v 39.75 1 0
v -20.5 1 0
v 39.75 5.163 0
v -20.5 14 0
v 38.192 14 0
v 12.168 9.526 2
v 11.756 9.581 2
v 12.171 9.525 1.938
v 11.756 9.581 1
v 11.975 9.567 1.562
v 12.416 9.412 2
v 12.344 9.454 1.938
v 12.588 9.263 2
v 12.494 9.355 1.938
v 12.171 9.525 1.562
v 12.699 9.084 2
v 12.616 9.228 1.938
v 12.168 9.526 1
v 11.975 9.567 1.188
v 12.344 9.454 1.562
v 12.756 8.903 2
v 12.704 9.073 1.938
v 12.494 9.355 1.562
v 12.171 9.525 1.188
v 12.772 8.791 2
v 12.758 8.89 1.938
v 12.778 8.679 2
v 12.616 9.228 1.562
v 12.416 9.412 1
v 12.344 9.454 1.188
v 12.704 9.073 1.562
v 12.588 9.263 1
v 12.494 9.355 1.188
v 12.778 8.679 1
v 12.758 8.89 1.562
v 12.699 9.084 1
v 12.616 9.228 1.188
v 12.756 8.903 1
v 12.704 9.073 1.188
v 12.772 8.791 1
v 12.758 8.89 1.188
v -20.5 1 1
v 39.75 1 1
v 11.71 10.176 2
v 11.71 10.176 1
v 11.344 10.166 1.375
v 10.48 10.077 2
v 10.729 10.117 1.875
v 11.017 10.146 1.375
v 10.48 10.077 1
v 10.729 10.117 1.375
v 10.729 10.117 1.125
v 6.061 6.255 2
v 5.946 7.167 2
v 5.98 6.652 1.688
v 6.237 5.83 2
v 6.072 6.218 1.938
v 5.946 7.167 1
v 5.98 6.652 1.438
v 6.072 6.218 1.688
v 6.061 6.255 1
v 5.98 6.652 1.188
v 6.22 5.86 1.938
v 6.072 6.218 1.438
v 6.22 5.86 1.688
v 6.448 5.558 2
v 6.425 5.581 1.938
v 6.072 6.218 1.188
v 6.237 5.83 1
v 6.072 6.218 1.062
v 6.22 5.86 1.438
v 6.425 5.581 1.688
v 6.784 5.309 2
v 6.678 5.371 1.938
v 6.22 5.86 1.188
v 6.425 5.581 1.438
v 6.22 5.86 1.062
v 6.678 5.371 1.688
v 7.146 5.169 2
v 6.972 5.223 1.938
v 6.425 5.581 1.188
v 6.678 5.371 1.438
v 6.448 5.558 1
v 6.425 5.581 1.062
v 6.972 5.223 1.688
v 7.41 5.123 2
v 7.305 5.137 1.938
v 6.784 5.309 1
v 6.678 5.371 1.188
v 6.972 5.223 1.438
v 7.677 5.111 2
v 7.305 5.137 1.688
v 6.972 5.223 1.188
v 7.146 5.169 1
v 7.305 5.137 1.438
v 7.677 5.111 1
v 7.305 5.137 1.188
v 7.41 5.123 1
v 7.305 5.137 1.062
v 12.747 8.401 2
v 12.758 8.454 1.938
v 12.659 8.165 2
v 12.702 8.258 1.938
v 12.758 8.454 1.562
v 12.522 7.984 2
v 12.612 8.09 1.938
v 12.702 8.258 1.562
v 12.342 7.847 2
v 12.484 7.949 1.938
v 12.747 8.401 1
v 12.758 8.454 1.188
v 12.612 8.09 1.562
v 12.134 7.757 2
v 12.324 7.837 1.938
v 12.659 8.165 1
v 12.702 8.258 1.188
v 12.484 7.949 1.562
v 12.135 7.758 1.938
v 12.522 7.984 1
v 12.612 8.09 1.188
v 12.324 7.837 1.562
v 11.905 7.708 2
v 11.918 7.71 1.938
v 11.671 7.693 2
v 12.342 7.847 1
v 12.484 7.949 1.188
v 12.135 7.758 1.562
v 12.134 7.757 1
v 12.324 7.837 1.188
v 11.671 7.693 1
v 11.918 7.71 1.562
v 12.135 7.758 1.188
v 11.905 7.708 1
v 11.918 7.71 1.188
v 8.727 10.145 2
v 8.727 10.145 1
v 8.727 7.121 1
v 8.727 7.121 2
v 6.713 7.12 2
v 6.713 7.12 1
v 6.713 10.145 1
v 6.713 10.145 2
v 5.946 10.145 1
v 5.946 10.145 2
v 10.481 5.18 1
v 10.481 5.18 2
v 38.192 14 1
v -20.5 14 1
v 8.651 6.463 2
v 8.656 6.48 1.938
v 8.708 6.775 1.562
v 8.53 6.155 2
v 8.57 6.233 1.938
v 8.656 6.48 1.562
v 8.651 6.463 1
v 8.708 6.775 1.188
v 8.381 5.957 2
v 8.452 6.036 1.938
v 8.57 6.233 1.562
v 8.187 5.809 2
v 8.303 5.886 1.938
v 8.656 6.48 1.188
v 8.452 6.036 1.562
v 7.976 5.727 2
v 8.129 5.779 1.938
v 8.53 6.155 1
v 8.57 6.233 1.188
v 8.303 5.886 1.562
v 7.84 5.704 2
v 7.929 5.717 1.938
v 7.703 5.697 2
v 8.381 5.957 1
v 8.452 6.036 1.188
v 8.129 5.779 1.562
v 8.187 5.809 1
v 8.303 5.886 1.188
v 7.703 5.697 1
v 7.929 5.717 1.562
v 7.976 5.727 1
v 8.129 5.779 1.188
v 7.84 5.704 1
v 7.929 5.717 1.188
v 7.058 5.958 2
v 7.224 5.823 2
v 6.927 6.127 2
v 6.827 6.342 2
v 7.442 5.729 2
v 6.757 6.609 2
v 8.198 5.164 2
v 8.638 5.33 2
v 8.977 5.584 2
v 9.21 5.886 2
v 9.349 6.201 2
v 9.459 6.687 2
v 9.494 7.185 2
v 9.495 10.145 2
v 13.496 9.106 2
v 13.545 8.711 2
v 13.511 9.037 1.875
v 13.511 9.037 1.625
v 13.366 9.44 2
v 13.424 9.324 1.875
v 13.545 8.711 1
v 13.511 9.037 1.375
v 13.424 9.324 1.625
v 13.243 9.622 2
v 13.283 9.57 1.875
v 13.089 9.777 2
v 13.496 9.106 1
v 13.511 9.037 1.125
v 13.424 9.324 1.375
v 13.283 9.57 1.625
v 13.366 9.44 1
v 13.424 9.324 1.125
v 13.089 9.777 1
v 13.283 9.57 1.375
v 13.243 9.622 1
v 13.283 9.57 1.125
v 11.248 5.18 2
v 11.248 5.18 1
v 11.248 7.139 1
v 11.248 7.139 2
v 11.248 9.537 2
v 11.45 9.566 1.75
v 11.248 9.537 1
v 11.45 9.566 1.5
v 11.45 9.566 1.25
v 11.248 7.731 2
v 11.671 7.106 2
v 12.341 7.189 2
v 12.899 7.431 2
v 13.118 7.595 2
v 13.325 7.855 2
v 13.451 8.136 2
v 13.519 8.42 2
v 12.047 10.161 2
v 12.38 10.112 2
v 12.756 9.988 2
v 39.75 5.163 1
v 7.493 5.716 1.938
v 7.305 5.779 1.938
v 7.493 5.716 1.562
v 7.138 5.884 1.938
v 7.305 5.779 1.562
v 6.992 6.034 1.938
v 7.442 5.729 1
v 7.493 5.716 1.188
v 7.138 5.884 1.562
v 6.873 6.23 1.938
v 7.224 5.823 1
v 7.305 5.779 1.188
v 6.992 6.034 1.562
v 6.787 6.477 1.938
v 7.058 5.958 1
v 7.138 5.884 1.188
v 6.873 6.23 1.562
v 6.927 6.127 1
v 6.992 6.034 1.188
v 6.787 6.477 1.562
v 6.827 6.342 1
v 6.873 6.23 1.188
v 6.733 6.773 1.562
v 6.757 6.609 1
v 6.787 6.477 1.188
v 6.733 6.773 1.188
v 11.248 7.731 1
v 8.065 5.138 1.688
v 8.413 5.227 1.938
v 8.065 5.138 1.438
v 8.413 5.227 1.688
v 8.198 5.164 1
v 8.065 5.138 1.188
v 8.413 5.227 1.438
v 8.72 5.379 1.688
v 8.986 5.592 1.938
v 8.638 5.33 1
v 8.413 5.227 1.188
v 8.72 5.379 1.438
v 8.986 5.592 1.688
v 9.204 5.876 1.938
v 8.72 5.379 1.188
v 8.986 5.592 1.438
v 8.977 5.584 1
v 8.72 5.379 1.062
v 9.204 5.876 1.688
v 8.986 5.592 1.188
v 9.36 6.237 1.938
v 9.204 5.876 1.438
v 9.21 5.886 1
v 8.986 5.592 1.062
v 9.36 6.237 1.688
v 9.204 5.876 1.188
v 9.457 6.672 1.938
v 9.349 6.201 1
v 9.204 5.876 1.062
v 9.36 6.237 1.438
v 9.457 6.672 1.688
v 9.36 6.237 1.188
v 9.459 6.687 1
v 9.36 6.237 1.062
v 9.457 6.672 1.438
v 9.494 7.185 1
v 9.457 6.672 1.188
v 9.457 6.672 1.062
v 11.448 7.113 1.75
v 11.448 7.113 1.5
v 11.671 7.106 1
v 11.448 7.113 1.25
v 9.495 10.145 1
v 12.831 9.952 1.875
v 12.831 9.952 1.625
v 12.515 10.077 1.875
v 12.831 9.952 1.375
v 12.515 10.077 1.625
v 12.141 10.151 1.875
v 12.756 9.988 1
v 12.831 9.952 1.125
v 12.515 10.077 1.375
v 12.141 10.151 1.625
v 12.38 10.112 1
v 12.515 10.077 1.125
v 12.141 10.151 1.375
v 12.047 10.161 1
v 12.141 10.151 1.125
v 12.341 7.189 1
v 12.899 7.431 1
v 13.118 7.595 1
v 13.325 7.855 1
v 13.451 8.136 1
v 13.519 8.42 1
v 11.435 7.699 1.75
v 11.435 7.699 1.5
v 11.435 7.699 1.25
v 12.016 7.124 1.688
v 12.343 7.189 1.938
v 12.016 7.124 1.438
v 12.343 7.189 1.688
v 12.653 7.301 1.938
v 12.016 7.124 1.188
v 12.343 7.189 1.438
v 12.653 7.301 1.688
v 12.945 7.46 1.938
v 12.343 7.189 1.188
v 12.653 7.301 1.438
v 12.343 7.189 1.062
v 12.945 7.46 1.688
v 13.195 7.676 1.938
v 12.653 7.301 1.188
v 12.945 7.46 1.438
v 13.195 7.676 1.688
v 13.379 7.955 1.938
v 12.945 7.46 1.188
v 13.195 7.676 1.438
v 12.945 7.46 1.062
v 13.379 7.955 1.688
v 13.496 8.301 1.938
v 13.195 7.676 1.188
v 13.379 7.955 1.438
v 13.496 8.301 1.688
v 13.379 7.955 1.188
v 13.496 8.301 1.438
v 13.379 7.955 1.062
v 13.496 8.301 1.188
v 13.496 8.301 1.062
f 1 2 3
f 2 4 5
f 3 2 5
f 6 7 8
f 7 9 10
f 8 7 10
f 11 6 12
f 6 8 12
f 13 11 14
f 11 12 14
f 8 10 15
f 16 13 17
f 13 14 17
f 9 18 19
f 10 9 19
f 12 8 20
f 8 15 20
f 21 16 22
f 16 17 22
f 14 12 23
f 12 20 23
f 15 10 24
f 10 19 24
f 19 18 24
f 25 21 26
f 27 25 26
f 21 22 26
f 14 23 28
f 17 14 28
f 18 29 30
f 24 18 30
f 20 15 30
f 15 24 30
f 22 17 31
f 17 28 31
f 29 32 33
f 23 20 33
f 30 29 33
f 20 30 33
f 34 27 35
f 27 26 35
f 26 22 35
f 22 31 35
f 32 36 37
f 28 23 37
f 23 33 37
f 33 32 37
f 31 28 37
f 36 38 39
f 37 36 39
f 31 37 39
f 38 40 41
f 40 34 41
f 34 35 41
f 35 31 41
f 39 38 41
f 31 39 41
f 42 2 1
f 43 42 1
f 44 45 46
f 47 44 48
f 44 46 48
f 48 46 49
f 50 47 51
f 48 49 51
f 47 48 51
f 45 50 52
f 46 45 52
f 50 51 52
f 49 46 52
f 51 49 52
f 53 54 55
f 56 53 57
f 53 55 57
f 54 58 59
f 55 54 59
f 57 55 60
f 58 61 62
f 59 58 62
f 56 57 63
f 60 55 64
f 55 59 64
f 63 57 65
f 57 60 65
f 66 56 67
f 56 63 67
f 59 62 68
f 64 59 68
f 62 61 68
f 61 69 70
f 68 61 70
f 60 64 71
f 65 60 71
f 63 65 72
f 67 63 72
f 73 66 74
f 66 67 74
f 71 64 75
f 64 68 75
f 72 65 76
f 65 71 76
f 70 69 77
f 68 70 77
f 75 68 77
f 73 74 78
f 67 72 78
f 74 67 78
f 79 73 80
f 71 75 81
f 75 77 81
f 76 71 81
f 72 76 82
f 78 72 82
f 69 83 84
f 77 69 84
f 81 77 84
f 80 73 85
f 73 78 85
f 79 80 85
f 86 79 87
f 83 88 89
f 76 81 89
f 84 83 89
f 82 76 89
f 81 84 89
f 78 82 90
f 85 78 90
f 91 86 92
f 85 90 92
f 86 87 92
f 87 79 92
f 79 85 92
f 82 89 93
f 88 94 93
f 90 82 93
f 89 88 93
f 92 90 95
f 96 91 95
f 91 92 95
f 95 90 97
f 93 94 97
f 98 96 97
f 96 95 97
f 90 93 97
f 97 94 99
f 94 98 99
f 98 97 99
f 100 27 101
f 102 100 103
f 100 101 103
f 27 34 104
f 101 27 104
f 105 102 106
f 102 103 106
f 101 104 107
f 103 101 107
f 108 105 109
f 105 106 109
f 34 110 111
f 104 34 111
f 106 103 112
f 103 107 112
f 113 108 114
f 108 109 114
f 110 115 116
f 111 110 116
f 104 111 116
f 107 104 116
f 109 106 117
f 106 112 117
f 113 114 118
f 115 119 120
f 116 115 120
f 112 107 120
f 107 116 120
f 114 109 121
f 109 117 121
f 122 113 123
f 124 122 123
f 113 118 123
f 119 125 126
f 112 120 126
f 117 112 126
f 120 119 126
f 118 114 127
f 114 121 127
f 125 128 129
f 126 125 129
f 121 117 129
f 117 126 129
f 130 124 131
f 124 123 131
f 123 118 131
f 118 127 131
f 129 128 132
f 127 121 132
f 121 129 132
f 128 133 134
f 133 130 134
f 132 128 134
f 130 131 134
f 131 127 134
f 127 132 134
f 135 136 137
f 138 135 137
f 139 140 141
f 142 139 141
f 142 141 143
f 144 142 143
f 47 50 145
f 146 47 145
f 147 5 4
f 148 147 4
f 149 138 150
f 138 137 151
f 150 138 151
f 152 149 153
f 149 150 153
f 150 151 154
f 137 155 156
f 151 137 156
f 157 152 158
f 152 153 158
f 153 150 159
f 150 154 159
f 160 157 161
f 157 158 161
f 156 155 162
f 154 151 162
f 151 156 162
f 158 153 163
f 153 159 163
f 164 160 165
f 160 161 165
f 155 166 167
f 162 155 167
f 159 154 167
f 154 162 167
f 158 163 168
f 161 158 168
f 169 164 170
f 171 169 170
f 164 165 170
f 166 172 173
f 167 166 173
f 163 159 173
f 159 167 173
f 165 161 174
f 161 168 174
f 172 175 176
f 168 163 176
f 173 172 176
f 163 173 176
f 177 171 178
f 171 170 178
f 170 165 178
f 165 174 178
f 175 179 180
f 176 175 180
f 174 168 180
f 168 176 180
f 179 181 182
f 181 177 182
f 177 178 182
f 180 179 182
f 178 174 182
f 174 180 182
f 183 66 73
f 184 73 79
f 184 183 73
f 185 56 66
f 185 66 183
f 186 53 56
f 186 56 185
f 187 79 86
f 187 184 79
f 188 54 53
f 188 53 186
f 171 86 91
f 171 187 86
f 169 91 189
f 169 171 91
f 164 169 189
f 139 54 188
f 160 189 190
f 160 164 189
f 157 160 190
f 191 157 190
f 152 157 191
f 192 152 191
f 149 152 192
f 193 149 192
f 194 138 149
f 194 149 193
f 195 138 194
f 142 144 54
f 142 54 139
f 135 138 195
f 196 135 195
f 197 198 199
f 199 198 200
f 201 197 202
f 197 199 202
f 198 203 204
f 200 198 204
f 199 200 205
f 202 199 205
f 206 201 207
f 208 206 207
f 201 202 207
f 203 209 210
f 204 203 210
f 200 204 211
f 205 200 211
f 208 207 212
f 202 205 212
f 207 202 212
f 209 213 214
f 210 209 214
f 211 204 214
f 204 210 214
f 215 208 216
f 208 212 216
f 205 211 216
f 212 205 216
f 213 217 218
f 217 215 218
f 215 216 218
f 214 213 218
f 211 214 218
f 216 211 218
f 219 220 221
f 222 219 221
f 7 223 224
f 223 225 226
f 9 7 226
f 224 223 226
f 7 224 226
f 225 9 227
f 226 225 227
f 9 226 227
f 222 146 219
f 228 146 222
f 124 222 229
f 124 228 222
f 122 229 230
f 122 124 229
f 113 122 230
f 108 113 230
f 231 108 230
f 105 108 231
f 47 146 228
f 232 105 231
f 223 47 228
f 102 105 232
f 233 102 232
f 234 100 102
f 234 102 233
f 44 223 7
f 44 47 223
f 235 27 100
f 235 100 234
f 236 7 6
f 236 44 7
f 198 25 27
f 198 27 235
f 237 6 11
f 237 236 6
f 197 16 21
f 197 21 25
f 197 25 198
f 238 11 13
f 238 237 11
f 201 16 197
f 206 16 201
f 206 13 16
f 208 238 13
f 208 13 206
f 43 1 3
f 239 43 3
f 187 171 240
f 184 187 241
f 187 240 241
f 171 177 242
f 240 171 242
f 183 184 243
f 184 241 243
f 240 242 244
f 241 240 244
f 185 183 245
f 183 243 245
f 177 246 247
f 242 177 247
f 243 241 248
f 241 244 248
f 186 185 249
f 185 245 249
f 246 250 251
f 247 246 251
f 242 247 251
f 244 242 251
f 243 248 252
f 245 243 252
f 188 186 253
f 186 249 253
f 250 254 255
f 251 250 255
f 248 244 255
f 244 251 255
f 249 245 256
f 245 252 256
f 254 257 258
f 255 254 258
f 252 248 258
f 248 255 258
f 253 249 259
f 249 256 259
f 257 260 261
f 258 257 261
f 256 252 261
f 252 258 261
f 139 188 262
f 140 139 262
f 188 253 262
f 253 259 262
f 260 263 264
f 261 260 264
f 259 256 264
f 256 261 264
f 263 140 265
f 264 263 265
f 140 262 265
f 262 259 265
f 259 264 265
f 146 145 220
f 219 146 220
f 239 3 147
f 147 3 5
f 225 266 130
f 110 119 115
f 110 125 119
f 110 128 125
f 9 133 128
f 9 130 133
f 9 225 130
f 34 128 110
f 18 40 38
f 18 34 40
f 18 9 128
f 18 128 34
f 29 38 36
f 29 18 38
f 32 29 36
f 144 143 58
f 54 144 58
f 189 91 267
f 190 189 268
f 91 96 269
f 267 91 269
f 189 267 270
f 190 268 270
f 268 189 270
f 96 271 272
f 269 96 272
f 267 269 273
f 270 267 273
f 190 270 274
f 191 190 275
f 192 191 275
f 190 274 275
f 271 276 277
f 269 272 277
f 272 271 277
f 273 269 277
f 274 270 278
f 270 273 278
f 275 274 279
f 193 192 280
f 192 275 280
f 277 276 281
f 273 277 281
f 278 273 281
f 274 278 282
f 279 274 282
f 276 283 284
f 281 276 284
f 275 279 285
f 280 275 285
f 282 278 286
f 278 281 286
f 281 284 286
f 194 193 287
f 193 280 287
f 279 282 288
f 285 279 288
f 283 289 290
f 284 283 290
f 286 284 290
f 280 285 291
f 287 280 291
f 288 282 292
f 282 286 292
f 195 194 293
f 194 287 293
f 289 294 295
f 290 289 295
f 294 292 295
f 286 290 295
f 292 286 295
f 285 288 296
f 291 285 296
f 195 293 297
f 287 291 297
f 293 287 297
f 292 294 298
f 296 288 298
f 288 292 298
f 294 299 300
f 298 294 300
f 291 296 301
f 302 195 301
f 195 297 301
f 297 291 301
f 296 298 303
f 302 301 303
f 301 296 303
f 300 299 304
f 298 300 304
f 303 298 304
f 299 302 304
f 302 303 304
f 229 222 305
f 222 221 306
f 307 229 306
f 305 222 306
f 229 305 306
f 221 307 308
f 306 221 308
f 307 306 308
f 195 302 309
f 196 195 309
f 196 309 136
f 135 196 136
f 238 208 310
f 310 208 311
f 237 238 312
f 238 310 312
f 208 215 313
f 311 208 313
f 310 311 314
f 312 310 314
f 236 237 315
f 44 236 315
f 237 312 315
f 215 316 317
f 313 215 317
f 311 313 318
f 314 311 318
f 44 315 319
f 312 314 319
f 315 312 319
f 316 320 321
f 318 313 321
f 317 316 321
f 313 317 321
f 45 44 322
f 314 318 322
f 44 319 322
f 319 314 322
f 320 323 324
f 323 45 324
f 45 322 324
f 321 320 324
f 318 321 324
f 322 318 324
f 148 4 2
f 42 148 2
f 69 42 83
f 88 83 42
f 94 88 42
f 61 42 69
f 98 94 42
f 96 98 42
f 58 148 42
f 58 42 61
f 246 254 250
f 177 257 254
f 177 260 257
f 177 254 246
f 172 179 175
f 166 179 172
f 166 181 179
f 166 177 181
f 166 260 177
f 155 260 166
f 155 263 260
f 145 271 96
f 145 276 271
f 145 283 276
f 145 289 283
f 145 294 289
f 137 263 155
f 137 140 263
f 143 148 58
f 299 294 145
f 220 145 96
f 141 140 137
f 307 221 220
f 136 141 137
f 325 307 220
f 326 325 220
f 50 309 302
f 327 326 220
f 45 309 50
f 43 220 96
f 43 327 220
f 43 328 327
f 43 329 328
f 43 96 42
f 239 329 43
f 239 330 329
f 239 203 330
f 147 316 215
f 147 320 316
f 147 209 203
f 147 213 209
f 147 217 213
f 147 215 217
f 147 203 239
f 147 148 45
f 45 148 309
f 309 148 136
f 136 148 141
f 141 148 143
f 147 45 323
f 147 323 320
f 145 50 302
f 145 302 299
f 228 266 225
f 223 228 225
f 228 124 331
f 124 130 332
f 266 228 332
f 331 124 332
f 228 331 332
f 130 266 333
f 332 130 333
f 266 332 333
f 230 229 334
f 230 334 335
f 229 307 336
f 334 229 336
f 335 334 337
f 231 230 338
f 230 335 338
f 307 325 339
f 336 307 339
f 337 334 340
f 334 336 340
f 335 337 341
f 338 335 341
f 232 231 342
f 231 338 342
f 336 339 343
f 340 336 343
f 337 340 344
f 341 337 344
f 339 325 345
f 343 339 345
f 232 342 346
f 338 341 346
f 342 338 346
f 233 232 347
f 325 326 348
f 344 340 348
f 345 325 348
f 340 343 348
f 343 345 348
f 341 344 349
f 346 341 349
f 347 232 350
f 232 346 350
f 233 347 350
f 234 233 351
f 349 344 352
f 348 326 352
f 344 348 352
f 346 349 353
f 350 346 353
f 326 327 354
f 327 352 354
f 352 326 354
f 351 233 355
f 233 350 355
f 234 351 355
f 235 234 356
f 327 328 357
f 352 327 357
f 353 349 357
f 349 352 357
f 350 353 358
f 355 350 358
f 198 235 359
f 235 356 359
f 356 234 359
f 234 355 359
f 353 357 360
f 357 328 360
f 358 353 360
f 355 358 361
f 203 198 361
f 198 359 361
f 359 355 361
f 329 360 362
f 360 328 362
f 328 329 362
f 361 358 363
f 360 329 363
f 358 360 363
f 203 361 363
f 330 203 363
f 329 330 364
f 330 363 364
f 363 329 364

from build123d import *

# Parameters (mm, degrees)
EXTRUDE_1_DEPTH = 1
EXTRUDE_2_DEPTH = 1


with BuildPart() as part:
    # 草图2 → 凸台-拉伸1 (new body)
    with BuildSketch(Plane.XY):
        Polygon((-20.5, 1), (39.75, 1), (39.75, 5.162511336), (38.191712307, 14), (-20.5, 14), align=None)
    extrude(amount=EXTRUDE_1_DEPTH)

    # 草图3 → 凸台-拉伸2 (add)
    # profile 1 of 2: a face of its own
    with BuildSketch(Plane.XY.offset(1)):
        with BuildLine():
            Line((10.481008306, 5.180393764), (11.248205137, 5.180393764))
            Line((11.248205137, 5.180393764), (11.248205137, 7.138792231))
            add(Edge.make_bspline(
                [(11.248205137, 7.138792231), (11.280268125, 7.133099507), (11.346316296, 7.121372777), (11.449283839, 7.111830081), (11.558346323, 7.105847724), (11.633053511, 7.105955746), (11.671485638, 7.106011317)],
                knots=[0, 0, 0, 0, 0.918585764, 1.892241272, 2.915691322, 4, 4, 4, 4], degree=3))
            add(Edge.make_bspline(
                [(11.671485638, 7.106011317), (11.729785366, 7.106041643), (11.845025321, 7.106101586), (12.015487029, 7.122104566), (12.181692953, 7.148109054), (12.343324735, 7.187087519), (12.50082336, 7.237455337), (12.654314168, 7.298636251), (12.80298521, 7.372843607), (12.946131503, 7.457876132), (13.080836859, 7.556007269), (13.198248856, 7.673392446), (13.300029776, 7.806147684), (13.3829419, 7.956216651), (13.450592093, 8.121964161), (13.499729538, 8.304167199), (13.533442208, 8.502261401), (13.541101546, 8.639948748), (13.545068751, 8.711264826)],
                knots=[0, 0, 0, 0, 1.003522523, 1.98364375, 2.944869411, 3.898614004, 4.843729631, 5.790462383, 6.741287792, 7.702146141, 8.655643954, 9.602935836, 10.551034771, 11.527201242, 12.5464735, 13.626777097, 14.770773406, 16, 16, 16, 16], degree=3))
            add(Edge.make_bspline(
                [(13.545068751, 8.711264826), (13.542621314, 8.767407479), (13.537856522, 8.876708825), (13.513966748, 9.035247709), (13.476887205, 9.183894353), (13.427758946, 9.323326261), (13.361987826, 9.451787215), (13.285822021, 9.571837482), (13.194736975, 9.681556892), (13.124181783, 9.745091174), (13.08871946, 9.77702466)],
                knots=[0, 0, 0, 0, 1.126595518, 2.193312949, 3.209115705, 4.196248007, 5.151139266, 6.097382339, 7.043709754, 8, 8, 8, 8], degree=3))
            add(Edge.make_bspline(
                [(13.08871946, 9.77702466), (13.048819299, 9.809220998), (12.967763644, 9.874626629), (12.829758648, 9.955555414), (12.678205789, 10.024206618), (12.512562725, 10.081265594), (12.332183639, 10.124461936), (12.1373955, 10.153402083), (11.928575344, 10.173362723), (11.784600384, 10.174930082), (11.710223363, 10.175739775)],
                knots=[0, 0, 0, 0, 0.838628006, 1.70364077, 2.610636308, 3.559859354, 4.568055018, 5.643200099, 6.782484425, 8, 8, 8, 8], degree=3))
            add(Edge.make_bspline(
                [(11.710223363, 10.175739775), (11.647547246, 10.17461434), (11.525326605, 10.172419704), (11.347031706, 10.166981234), (11.178493577, 10.158615294), (11.019779498, 10.147008031), (10.870704987, 10.134275133), (10.731447222, 10.118184966), (10.602269579, 10.099521255), (10.519709866, 10.084629366), (10.480064406, 10.07747823)],
                knots=[0, 0, 0, 0, 1.217605855, 2.374374404, 3.464660226, 4.494999595, 5.465333604, 6.370582827, 7.217548217, 8, 8, 8, 8], degree=3))
            Line((10.480064406, 10.07747823), (10.481008306, 5.180393764))
        make_face()
        with BuildLine():
            add(Edge.make_bspline(
                [(11.248205137, 9.536781383), (11.27774721, 9.542613746), (11.344633086, 9.555818735), (11.458986924, 9.567908637), (11.598601931, 9.577170189), (11.700441396, 9.579944465), (11.755574845, 9.581446392)],
                knots=[0, 0, 0, 0, 0.708180311, 1.603383121, 2.702528978, 4, 4, 4, 4], degree=3))
            add(Edge.make_bspline(
                [(11.755574845, 9.581446392), (11.793073561, 9.580660892), (11.86632842, 9.579126393), (11.973460101, 9.568908362), (12.074759776, 9.550753083), (12.17072877, 9.526581699), (12.260478405, 9.494387574), (12.34469003, 9.455320337), (12.422963445, 9.40924223), (12.495093205, 9.356007774), (12.560949572, 9.296684339), (12.618080877, 9.228947702), (12.666017981, 9.154020887), (12.706384443, 9.072744901), (12.737473184, 8.984178001), (12.75980904, 8.888502208), (12.77423784, 8.786014927), (12.776639324, 8.715407993), (12.777872842, 8.679140859)],
                knots=[0, 0, 0, 0, 1.164286524, 2.274468469, 3.33712435, 4.356941393, 5.343590938, 6.292901648, 7.23538906, 8.158502959, 9.072142365, 9.981112688, 10.900594105, 11.827687296, 12.792632354, 13.80775062, 14.873954761, 16, 16, 16, 16], degree=3))
            add(Edge.make_bspline(
                [(12.777872842, 8.679140859), (12.776613433, 8.640363707), (12.774167963, 8.56506781), (12.76019411, 8.455822494), (12.736174009, 8.3537626), (12.704419521, 8.258318665), (12.663824966, 8.169544292), (12.613156623, 8.088395241), (12.553144539, 8.014538438), (12.485007553, 7.946950655), (12.408057089, 7.887831849), (12.324594044, 7.835136167), (12.233012254, 7.791830384), (12.134562282, 7.756148342), (12.029100063, 7.727426213), (11.916122917, 7.708209363), (11.796164858, 7.695683181), (11.713720416, 7.693741042), (11.671485638, 7.692746119)],
                knots=[0, 0, 0, 0, 1.10647952, 2.148516939, 3.135813804, 4.093347323, 5.013956832, 5.913991464, 6.814877829, 7.723438285, 8.645449828, 9.577866136, 10.534345172, 11.529217628, 12.562346088, 13.648092354, 14.795160789, 16, 16, 16, 16], degree=3))
            add(Edge.make_bspline(
                [(11.671485638, 7.692746119), (11.63021482, 7.692200684), (11.551388911, 7.691158922), (11.439442024, 7.698169967), (11.339043734, 7.709168238), (11.277392814, 7.723672298), (11.248205137, 7.730539021)],
                knots=[0, 0, 0, 0, 1.161518353, 2.218461969, 3.156558288, 4, 4, 4, 4], degree=3))
            Line((11.248205137, 7.730539021), (11.248205137, 9.536781383))
        make_face(mode=Mode.SUBTRACT)
    # profile 2 of 2: a face of its own
    with BuildSketch(Plane.XY.offset(1)):
        with BuildLine():
            Line((9.494613566, 10.144699032), (8.727416734, 10.144699032))
            Line((8.727416734, 10.144699032), (8.727416734, 7.120977159))
            add(Edge.make_bspline(
                [(8.727416734, 7.120977159), (8.72570679, 7.061167821), (8.722407633, 6.945772013), (8.709631742, 6.778889408), (8.688170718, 6.624510706), (8.658230337, 6.482310653), (8.619760507, 6.352261672), (8.572739739, 6.23481111), (8.517630595, 6.129485265), (8.454448576, 6.036324521), (8.382626209, 5.95552631), (8.305148113, 5.884790711), (8.220215209, 5.826242463), (8.129699085, 5.776987395), (8.031964883, 5.740430268), (7.92791034, 5.715069684), (7.817708054, 5.699600995), (7.742020532, 5.698067043), (7.703230938, 5.697280898)],
                knots=[0, 0, 0, 0, 1.442558911, 2.783265207, 4.033293762, 5.19797452, 6.283894868, 7.299176403, 8.243481286, 9.144954945, 10.005756174, 10.844503658, 11.66816234, 12.486940923, 13.323278702, 14.176003432, 15.065208066, 16, 16, 16, 16], degree=3))
            add(Edge.make_bspline(
                [(7.703230938, 5.697280898), (7.667274667, 5.697698259), (7.596903954, 5.698515082), (7.494090027, 5.713985225), (7.396870282, 5.740714967), (7.304631521, 5.777818192), (7.21742606, 5.824889909), (7.136059616, 5.88355453), (7.060255296, 5.953212566), (6.989139578, 6.033370677), (6.925239634, 6.126225718), (6.869986093, 6.231342171), (6.822149712, 6.348958788), (6.784585577, 6.479350068), (6.752971554, 6.621900529), (6.730985424, 6.776989679), (6.716631756, 6.944497921), (6.714275141, 7.060313631), (6.713056908, 7.120183655)],
                knots=[0, 0, 0, 0, 0.880869997, 1.723967724, 2.54076827, 3.348096003, 4.15667844, 4.964596865, 5.80091263, 6.676282017, 7.586647838, 8.557371955, 9.582678263, 10.694376867, 11.880403812, 13.160330013, 14.532054847, 16, 16, 16, 16], degree=3))
            Line((6.713056908, 7.120183655), (6.713056908, 10.144699032))
            Line((6.713056908, 10.144699032), (5.945860076, 10.144699032))
            Line((5.945860076, 10.144699032), (5.945860076, 7.166692176))
            add(Edge.make_bspline(
                [(5.945860076, 7.166692176), (5.947811599, 7.077745647), (5.951582552, 6.905873082), (5.976446082, 6.658325939), (6.014608186, 6.430215629), (6.067172501, 6.221450241), (6.133738874, 6.031572757), (6.214969708, 5.861101508), (6.31051972, 5.710146918), (6.421501903, 5.57950536), (6.544430093, 5.46706325), (6.67617651, 5.36843753), (6.819480172, 5.287205614), (6.971797177, 5.219666165), (7.13441307, 5.168482563), (7.306791456, 5.134357698), (7.4884993, 5.112474089), (7.613091953, 5.111823473), (7.676775907, 5.111490919)],
                knots=[0, 0, 0, 0, 1.389947096, 2.68581329, 3.884176986, 5.001519278, 6.046082896, 7.023506491, 7.946473535, 8.830015835, 9.69383004, 10.545329235, 11.396344648, 12.262399475, 13.145009074, 14.054291982, 15.00547603, 16, 16, 16, 16], degree=3))
            add(Edge.make_bspline(
                [(7.676775907, 5.111490919), (7.743278786, 5.112273586), (7.873172166, 5.113802291), (8.063018751, 5.134646007), (8.242559022, 5.17174834), (8.412356909, 5.222999832), (8.571712956, 5.292121054), (8.721258262, 5.375818025), (8.860035095, 5.476399667), (8.989854742, 5.590728631), (9.106884057, 5.723770561), (9.2085838, 5.876673755), (9.294366864, 6.048926123), (9.364814239, 6.239771985), (9.420601689, 6.449185846), (9.460084235, 6.67781481), (9.487297433, 6.925232139), (9.491500008, 7.096800861), (9.493669666, 7.185376411)],
                knots=[0, 0, 0, 0, 1.013962662, 1.980471211, 2.907472823, 3.806985122, 4.680561309, 5.551651082, 6.415505808, 7.289926821, 8.185106327, 9.109702809, 10.082849364, 11.113391155, 12.207519227, 13.383461846, 14.649163417, 16, 16, 16, 16], degree=3))
            Line((9.493669666, 7.185376411), (9.494613566, 10.144699032))
        make_face()
    extrude(amount=EXTRUDE_2_DEPTH)


solid = part.part
